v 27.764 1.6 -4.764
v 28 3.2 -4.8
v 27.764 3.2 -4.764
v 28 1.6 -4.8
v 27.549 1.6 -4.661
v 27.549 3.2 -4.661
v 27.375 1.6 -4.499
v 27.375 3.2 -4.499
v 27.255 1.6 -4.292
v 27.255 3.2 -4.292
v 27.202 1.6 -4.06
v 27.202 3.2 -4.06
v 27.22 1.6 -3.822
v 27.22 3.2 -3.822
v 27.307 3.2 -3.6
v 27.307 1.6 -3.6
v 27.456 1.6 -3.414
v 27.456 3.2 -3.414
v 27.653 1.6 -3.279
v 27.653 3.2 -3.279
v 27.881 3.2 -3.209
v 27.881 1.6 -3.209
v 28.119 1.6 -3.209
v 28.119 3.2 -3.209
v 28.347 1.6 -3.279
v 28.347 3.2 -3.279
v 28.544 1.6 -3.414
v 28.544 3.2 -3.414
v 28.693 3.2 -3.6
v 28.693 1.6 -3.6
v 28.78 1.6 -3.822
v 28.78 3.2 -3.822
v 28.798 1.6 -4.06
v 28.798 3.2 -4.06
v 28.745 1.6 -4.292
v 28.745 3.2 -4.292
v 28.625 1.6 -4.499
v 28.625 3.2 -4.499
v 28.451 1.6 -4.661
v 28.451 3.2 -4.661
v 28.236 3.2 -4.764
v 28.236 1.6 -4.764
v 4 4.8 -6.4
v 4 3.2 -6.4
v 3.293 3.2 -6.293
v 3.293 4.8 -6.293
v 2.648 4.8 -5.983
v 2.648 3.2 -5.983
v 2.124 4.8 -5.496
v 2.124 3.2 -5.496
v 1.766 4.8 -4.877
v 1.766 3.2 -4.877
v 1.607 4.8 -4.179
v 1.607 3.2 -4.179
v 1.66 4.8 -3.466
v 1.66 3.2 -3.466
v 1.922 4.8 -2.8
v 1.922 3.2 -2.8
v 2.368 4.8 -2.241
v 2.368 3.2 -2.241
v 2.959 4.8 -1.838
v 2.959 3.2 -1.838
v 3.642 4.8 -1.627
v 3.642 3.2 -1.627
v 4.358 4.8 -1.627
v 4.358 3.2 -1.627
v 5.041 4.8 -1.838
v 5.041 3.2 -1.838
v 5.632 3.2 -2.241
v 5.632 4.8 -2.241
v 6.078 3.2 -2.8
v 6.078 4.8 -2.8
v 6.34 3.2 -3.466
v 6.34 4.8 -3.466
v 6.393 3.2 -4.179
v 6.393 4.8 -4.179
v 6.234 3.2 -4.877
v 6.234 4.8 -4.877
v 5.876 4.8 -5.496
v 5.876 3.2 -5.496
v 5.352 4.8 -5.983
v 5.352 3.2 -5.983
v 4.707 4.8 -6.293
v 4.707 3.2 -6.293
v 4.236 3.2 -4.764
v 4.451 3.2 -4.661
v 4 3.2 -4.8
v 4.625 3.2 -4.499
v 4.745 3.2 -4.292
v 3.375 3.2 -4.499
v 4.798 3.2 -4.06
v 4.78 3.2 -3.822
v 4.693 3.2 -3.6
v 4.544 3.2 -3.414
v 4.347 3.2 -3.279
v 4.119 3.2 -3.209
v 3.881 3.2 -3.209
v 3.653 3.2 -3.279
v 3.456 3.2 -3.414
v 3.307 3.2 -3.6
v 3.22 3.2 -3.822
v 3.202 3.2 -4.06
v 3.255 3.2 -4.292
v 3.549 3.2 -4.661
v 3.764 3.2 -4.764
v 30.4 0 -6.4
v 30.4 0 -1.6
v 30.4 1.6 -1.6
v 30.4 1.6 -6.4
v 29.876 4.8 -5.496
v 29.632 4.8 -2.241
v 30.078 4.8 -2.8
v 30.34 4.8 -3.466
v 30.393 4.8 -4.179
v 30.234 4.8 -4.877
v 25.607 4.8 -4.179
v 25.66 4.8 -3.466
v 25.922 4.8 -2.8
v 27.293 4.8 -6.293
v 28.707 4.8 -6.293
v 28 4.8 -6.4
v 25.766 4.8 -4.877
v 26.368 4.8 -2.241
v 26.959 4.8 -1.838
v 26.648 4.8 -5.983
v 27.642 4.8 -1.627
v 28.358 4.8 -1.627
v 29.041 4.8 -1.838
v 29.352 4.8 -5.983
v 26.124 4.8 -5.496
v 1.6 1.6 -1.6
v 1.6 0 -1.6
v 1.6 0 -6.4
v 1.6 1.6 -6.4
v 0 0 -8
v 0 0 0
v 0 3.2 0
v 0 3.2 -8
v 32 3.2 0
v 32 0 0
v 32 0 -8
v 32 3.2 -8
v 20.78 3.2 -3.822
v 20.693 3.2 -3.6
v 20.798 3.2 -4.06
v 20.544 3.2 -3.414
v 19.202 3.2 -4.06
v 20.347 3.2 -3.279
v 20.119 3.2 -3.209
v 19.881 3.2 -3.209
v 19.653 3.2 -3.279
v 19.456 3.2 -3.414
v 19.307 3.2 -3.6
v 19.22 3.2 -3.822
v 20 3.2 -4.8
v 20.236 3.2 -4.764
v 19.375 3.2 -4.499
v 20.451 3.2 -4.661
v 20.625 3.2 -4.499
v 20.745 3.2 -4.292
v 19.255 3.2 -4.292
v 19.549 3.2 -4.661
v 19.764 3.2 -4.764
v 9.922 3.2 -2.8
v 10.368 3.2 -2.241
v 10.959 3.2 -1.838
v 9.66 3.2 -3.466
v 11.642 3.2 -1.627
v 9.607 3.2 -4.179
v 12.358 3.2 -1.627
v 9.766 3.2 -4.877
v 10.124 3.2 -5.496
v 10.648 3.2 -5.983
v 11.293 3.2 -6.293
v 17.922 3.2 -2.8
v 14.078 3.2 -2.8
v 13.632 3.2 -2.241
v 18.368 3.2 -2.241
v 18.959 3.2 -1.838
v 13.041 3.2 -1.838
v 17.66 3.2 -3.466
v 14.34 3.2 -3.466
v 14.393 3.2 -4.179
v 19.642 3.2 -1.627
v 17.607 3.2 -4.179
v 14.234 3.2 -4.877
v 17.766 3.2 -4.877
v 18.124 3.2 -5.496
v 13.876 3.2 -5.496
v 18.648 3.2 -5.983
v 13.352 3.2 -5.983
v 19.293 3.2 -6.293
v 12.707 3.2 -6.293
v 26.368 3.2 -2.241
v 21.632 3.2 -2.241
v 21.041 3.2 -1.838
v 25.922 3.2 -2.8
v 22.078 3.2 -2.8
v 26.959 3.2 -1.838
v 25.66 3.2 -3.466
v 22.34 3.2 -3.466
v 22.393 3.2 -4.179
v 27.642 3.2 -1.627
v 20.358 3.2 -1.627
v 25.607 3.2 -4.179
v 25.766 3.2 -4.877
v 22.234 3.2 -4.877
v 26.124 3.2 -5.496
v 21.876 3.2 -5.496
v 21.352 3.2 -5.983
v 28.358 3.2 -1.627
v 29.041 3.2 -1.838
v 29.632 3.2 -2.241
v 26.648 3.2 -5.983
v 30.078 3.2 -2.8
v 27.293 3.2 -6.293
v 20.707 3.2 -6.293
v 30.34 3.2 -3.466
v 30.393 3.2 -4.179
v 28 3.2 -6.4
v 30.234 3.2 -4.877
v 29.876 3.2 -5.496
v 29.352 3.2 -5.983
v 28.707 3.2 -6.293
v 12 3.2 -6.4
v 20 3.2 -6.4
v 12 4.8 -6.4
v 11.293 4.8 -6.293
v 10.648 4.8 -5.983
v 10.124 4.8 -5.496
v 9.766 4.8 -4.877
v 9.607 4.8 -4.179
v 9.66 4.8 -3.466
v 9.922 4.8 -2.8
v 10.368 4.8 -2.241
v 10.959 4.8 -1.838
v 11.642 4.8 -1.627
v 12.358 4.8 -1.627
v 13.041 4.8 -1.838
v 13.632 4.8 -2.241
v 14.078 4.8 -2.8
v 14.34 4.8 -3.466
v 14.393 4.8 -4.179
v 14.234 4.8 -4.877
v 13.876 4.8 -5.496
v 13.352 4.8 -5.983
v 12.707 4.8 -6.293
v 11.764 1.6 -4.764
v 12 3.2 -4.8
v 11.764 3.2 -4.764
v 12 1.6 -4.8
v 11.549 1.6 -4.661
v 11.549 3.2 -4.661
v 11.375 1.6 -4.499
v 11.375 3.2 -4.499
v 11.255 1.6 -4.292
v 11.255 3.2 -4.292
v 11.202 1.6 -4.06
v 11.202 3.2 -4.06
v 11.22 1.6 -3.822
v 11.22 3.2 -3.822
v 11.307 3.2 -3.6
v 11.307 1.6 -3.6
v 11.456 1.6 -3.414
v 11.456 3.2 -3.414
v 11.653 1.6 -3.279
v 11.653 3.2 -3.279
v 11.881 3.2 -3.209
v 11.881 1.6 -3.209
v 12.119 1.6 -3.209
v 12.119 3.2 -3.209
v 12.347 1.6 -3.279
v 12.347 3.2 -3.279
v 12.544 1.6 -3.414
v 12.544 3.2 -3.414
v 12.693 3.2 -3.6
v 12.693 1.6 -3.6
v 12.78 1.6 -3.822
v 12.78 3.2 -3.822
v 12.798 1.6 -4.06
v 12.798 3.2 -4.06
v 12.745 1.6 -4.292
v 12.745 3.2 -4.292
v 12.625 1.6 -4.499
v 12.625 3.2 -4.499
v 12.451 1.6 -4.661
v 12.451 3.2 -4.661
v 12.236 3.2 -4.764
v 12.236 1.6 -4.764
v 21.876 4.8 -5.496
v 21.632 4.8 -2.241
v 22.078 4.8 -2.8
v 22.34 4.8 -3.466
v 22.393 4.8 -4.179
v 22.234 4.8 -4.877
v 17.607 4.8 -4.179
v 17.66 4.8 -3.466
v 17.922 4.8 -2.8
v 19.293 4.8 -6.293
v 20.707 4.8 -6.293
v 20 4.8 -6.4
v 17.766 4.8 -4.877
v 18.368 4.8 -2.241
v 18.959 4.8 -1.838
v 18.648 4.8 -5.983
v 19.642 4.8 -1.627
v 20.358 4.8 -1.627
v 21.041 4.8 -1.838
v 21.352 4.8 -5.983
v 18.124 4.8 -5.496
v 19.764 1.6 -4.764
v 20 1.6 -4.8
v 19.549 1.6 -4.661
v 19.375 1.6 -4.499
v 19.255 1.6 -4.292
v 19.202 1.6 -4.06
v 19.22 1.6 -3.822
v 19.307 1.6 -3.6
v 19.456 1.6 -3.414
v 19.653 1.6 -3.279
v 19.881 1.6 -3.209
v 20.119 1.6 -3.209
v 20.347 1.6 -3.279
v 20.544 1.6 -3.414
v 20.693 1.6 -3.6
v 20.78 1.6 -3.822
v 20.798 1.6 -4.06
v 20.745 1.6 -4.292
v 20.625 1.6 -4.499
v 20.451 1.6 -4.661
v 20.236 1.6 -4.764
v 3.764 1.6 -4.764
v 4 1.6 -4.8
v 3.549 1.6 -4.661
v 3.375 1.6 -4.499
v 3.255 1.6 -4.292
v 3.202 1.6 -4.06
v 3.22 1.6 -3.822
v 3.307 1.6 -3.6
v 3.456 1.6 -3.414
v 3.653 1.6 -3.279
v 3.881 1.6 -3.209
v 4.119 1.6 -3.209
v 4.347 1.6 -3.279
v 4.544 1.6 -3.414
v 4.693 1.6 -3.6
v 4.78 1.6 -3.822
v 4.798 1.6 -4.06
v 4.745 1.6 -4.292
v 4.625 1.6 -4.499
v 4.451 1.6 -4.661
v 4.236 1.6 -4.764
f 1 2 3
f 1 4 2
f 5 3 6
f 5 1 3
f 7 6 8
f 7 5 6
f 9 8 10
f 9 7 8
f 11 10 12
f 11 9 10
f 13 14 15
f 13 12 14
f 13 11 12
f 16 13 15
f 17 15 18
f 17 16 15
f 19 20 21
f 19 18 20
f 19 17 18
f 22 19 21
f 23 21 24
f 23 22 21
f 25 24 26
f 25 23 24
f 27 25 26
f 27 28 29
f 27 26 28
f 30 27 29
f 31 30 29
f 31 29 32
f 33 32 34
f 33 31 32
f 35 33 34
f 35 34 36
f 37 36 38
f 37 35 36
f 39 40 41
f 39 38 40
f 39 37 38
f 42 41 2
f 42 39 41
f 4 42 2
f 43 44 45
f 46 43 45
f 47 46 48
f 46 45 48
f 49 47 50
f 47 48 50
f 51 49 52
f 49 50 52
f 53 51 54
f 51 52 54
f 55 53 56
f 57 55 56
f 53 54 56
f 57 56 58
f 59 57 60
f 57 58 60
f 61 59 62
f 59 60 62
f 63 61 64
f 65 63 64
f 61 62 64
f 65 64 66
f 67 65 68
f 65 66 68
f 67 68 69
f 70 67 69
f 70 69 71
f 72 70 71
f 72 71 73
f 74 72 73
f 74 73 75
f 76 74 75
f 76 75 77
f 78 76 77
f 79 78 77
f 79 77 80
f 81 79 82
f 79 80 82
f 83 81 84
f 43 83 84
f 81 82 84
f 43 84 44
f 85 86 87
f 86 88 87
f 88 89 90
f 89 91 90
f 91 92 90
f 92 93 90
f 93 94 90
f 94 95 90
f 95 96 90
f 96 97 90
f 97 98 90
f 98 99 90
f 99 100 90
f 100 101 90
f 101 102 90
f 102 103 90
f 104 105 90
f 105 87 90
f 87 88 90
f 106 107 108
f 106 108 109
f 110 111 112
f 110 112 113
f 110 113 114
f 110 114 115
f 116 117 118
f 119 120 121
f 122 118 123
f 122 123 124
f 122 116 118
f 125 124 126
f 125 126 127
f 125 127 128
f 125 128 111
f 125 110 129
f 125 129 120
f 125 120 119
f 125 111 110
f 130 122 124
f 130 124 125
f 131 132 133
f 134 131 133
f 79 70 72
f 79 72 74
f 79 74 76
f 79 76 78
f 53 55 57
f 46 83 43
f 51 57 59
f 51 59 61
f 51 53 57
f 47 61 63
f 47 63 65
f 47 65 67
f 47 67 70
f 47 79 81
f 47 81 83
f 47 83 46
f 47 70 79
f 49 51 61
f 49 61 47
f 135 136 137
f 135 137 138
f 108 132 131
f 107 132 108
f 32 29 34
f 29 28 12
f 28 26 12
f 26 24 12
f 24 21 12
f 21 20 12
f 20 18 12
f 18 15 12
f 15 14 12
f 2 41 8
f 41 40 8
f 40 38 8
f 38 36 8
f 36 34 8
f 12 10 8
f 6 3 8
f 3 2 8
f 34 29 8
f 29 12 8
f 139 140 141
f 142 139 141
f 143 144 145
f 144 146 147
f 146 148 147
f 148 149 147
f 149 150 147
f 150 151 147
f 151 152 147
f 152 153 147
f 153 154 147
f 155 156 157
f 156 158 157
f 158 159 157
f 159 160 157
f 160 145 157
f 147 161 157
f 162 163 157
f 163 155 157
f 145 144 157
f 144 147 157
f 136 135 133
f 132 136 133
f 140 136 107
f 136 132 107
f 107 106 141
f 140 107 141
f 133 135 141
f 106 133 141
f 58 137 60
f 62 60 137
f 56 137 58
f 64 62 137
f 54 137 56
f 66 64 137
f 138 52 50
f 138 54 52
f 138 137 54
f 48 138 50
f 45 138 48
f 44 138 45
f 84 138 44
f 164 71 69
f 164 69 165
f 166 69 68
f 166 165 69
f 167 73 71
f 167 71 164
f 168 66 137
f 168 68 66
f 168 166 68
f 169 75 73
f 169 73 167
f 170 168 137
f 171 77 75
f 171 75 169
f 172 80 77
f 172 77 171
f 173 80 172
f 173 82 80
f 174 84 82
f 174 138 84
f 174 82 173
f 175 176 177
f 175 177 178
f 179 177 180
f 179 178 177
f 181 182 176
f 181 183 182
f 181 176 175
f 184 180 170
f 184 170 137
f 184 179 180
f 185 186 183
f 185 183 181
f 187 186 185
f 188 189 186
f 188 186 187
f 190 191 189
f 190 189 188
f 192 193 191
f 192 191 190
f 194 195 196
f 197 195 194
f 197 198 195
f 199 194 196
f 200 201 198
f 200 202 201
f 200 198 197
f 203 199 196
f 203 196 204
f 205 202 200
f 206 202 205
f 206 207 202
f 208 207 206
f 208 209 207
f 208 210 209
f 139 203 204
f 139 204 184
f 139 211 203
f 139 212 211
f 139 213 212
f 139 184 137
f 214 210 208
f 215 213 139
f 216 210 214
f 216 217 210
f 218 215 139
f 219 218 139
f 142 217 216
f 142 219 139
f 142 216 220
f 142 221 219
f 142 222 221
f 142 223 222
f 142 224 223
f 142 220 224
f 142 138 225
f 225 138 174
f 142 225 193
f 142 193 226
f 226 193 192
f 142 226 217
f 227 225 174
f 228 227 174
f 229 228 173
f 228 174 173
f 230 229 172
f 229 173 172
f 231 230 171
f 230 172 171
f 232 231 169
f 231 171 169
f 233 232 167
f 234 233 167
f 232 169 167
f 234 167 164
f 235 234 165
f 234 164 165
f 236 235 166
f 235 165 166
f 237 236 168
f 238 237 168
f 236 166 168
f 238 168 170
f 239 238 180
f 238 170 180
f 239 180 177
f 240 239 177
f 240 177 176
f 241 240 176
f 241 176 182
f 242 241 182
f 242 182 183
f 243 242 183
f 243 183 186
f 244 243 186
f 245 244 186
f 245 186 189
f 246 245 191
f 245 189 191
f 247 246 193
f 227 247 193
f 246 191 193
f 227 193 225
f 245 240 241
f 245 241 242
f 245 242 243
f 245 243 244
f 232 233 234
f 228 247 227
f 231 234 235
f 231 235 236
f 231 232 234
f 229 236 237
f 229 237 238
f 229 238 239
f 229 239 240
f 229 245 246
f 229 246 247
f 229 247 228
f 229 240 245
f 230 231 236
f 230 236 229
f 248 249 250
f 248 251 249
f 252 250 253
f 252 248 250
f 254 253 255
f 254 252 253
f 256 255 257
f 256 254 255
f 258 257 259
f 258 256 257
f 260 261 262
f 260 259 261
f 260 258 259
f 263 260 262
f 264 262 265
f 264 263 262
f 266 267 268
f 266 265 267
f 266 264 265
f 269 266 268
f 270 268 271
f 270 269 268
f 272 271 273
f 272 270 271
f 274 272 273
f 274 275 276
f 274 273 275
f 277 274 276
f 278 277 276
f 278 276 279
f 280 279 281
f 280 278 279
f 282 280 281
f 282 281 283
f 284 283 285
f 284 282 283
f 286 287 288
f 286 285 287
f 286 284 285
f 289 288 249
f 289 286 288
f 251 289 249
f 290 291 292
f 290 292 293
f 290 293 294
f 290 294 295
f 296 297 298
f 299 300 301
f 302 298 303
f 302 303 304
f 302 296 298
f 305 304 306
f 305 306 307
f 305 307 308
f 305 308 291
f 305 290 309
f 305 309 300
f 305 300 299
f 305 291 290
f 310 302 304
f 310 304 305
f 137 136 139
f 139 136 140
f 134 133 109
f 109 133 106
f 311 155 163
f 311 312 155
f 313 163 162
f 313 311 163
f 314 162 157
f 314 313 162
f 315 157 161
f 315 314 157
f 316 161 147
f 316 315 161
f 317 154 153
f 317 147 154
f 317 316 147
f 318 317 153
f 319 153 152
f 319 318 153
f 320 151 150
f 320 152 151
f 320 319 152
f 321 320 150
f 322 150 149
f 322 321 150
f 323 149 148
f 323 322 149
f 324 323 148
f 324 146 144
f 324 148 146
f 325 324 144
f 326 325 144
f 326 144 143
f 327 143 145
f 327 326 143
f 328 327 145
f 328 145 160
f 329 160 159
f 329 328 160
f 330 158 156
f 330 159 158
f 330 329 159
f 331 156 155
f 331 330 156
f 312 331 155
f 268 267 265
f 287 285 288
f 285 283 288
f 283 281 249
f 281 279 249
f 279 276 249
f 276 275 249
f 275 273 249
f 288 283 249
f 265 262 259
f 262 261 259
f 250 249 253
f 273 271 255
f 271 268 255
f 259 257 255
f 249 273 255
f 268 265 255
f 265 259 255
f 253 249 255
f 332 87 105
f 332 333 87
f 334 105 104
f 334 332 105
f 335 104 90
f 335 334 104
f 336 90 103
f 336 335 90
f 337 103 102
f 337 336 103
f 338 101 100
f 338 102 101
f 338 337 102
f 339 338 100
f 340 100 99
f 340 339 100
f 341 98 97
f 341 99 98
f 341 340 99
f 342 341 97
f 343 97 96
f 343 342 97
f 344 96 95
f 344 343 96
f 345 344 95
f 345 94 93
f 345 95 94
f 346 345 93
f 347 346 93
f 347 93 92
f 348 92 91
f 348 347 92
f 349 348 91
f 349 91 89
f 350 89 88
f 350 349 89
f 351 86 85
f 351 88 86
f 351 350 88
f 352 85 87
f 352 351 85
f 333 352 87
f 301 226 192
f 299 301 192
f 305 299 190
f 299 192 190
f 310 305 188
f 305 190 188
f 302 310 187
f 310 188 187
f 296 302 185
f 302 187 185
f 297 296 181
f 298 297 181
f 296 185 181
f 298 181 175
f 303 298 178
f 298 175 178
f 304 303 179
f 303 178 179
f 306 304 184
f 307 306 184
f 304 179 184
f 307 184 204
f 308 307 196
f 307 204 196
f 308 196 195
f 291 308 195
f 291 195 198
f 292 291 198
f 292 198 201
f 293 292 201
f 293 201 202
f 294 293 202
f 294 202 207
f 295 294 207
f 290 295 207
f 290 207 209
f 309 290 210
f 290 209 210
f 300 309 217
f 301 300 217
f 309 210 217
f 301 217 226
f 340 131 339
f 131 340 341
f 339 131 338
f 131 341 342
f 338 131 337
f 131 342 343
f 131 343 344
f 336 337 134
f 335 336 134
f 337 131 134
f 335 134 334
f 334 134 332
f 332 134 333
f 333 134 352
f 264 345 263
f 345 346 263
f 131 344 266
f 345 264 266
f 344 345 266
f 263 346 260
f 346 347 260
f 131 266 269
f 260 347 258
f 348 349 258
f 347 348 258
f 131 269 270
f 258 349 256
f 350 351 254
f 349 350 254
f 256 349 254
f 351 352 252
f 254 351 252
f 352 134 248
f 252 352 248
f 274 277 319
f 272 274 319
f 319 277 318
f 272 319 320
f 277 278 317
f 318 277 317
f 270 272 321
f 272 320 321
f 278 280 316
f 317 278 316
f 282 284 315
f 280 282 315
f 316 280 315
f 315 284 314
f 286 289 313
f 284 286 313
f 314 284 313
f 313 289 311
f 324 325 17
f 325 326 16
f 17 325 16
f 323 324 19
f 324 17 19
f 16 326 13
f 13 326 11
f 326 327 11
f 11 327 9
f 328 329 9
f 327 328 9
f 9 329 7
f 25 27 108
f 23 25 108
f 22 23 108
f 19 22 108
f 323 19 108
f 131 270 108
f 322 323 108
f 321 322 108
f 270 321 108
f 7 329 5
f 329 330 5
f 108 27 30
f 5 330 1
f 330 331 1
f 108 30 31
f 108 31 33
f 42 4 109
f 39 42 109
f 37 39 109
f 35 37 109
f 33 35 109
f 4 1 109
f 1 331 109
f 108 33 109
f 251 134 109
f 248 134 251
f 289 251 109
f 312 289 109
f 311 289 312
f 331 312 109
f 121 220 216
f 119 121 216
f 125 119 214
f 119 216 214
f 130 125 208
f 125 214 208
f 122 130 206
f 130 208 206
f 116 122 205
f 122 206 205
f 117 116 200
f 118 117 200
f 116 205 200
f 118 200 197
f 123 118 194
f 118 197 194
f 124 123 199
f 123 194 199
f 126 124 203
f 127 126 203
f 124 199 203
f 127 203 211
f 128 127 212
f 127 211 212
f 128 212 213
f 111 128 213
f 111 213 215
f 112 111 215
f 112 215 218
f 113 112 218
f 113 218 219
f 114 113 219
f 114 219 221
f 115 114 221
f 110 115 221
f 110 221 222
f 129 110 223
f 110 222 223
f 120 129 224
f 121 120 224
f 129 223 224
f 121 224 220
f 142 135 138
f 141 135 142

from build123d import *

# Parameters (mm, degrees)
SKETCH1_W           = 32
SKETCH1_H           = 8
BOSS_EXTRUDE1_DEPTH = 3.2
SKETCH2_R           = 2.4
BOSS_EXTRUDE2_DEPTH = 1.6
LPATTERN1_COUNT     = 4
LPATTERN1_PITCH     = 8
SHELL1_T            = -1.6


with BuildPart() as part:
    # Sketch1 → Boss-Extrude1 (new body)
    with BuildSketch(Plane(origin=(0, 0, 0), x_dir=(1, 0, 0), z_dir=(0, 1, 0))):
        with Locations((16, 4)):
            Rectangle(SKETCH1_W, SKETCH1_H)
    extrude(amount=BOSS_EXTRUDE1_DEPTH)

    # Sketch2 → Boss-Extrude2 (add)
    with BuildSketch(Plane(origin=(0, 3.2, 0), x_dir=(1, 0, 0), z_dir=(0, 1, 0))):
        with Locations(Location((28, 4, 0), (0, 0, 90))):
            Circle(SKETCH2_R)
    boss_extrude2 = extrude(amount=BOSS_EXTRUDE2_DEPTH)

    # LPattern1: Boss-Extrude2 ×4
    with Locations(*[(-i * LPATTERN1_PITCH, 0, 0) for i in range(1, LPATTERN1_COUNT)]):
        add(boss_extrude2)

    # Shell1
    shell1_openings = [part.faces().sort_by_distance(p)[0] for p in [
        (16, 0, -4),
    ]]
    offset(amount=SHELL1_T, openings=shell1_openings, kind=Kind.INTERSECTION)


solid = part.part
